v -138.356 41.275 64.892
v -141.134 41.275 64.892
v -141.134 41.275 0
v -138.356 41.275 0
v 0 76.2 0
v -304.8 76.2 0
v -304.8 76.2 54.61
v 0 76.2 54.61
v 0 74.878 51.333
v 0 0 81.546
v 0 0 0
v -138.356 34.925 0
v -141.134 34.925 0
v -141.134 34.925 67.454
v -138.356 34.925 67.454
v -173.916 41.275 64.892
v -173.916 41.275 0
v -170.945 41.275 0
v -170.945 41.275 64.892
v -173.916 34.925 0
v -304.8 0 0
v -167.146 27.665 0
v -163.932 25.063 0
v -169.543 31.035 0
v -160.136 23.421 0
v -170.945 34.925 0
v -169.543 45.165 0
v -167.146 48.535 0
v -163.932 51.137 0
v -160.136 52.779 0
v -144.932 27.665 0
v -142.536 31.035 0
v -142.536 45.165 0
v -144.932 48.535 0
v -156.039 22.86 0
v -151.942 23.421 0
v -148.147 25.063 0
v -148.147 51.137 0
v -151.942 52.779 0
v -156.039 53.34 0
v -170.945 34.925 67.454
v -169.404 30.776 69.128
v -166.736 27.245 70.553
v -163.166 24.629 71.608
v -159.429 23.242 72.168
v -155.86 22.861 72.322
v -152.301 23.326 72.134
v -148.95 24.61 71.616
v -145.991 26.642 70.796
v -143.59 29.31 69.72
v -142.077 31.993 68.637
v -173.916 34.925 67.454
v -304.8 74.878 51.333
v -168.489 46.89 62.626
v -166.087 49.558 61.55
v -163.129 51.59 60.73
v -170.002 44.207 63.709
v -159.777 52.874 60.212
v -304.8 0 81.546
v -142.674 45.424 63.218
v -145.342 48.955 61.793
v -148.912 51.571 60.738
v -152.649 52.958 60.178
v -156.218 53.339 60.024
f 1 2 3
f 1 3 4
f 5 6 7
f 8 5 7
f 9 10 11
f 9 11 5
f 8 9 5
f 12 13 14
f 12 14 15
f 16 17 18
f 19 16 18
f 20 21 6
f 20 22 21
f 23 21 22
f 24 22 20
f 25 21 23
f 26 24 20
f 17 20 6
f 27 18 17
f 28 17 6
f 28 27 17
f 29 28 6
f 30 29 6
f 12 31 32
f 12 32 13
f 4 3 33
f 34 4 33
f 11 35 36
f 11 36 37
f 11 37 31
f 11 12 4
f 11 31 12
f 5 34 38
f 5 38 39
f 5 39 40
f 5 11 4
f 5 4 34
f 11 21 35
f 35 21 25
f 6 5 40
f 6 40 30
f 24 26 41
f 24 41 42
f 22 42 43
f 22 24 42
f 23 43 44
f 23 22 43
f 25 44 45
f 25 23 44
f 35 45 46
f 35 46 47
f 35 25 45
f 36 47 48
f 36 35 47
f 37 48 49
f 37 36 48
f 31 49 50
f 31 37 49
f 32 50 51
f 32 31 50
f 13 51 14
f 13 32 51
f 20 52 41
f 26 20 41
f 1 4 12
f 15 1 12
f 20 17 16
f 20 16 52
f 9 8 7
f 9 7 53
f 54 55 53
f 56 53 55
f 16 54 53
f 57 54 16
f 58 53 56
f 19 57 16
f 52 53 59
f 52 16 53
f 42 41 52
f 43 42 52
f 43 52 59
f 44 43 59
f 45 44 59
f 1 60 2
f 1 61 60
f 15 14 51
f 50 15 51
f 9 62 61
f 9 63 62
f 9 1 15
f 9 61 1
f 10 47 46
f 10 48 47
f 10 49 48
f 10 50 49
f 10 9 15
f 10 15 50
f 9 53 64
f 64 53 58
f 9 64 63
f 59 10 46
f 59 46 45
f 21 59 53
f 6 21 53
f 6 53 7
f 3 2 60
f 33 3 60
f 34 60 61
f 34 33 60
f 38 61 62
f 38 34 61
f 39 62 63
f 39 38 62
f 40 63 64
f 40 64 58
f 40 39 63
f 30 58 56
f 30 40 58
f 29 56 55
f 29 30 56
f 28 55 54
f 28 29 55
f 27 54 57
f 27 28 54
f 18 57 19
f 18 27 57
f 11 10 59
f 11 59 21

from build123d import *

# Parameters (mm, degrees)
F1_DEPTH = 304.8
F2_R     = 15.24
F3_DEPTH = 81.546806
F4_W     = 35.56
F4_H     = 6.35
F5_DEPTH = 81.546806


with BuildPart() as f1:
    # F0 (on Right) → F1 (new body)
    with BuildSketch(Plane.YZ):
        Polygon((0, 81.545806), (0, 0), (76.2, 0), (76.2, 50.8), (74.877944, 51.333434), align=None)
        Polygon((76.2, 54.61), (74.877944, 51.333434), (76.2, 50.8), align=None)
    extrude(amount=-F1_DEPTH)

    # F2 (on Top) → F3 (cut, through all)
    with BuildSketch(Plane.XY):
        with Locations((-156.039268, 38.1)):
            Circle(F2_R)
    extrude(amount=F3_DEPTH, mode=Mode.SUBTRACT)

    # F4 (on face) → F5 (cut, through all)
    with BuildSketch(Plane(origin=(0, 0, 0), x_dir=(1, 0, 0), z_dir=(0, 0, -1))):
        with Locations((-156.136081, -38.1)):
            Rectangle(F4_W, F4_H)
    extrude(amount=-F5_DEPTH, mode=Mode.SUBTRACT)


solid = f1.part
